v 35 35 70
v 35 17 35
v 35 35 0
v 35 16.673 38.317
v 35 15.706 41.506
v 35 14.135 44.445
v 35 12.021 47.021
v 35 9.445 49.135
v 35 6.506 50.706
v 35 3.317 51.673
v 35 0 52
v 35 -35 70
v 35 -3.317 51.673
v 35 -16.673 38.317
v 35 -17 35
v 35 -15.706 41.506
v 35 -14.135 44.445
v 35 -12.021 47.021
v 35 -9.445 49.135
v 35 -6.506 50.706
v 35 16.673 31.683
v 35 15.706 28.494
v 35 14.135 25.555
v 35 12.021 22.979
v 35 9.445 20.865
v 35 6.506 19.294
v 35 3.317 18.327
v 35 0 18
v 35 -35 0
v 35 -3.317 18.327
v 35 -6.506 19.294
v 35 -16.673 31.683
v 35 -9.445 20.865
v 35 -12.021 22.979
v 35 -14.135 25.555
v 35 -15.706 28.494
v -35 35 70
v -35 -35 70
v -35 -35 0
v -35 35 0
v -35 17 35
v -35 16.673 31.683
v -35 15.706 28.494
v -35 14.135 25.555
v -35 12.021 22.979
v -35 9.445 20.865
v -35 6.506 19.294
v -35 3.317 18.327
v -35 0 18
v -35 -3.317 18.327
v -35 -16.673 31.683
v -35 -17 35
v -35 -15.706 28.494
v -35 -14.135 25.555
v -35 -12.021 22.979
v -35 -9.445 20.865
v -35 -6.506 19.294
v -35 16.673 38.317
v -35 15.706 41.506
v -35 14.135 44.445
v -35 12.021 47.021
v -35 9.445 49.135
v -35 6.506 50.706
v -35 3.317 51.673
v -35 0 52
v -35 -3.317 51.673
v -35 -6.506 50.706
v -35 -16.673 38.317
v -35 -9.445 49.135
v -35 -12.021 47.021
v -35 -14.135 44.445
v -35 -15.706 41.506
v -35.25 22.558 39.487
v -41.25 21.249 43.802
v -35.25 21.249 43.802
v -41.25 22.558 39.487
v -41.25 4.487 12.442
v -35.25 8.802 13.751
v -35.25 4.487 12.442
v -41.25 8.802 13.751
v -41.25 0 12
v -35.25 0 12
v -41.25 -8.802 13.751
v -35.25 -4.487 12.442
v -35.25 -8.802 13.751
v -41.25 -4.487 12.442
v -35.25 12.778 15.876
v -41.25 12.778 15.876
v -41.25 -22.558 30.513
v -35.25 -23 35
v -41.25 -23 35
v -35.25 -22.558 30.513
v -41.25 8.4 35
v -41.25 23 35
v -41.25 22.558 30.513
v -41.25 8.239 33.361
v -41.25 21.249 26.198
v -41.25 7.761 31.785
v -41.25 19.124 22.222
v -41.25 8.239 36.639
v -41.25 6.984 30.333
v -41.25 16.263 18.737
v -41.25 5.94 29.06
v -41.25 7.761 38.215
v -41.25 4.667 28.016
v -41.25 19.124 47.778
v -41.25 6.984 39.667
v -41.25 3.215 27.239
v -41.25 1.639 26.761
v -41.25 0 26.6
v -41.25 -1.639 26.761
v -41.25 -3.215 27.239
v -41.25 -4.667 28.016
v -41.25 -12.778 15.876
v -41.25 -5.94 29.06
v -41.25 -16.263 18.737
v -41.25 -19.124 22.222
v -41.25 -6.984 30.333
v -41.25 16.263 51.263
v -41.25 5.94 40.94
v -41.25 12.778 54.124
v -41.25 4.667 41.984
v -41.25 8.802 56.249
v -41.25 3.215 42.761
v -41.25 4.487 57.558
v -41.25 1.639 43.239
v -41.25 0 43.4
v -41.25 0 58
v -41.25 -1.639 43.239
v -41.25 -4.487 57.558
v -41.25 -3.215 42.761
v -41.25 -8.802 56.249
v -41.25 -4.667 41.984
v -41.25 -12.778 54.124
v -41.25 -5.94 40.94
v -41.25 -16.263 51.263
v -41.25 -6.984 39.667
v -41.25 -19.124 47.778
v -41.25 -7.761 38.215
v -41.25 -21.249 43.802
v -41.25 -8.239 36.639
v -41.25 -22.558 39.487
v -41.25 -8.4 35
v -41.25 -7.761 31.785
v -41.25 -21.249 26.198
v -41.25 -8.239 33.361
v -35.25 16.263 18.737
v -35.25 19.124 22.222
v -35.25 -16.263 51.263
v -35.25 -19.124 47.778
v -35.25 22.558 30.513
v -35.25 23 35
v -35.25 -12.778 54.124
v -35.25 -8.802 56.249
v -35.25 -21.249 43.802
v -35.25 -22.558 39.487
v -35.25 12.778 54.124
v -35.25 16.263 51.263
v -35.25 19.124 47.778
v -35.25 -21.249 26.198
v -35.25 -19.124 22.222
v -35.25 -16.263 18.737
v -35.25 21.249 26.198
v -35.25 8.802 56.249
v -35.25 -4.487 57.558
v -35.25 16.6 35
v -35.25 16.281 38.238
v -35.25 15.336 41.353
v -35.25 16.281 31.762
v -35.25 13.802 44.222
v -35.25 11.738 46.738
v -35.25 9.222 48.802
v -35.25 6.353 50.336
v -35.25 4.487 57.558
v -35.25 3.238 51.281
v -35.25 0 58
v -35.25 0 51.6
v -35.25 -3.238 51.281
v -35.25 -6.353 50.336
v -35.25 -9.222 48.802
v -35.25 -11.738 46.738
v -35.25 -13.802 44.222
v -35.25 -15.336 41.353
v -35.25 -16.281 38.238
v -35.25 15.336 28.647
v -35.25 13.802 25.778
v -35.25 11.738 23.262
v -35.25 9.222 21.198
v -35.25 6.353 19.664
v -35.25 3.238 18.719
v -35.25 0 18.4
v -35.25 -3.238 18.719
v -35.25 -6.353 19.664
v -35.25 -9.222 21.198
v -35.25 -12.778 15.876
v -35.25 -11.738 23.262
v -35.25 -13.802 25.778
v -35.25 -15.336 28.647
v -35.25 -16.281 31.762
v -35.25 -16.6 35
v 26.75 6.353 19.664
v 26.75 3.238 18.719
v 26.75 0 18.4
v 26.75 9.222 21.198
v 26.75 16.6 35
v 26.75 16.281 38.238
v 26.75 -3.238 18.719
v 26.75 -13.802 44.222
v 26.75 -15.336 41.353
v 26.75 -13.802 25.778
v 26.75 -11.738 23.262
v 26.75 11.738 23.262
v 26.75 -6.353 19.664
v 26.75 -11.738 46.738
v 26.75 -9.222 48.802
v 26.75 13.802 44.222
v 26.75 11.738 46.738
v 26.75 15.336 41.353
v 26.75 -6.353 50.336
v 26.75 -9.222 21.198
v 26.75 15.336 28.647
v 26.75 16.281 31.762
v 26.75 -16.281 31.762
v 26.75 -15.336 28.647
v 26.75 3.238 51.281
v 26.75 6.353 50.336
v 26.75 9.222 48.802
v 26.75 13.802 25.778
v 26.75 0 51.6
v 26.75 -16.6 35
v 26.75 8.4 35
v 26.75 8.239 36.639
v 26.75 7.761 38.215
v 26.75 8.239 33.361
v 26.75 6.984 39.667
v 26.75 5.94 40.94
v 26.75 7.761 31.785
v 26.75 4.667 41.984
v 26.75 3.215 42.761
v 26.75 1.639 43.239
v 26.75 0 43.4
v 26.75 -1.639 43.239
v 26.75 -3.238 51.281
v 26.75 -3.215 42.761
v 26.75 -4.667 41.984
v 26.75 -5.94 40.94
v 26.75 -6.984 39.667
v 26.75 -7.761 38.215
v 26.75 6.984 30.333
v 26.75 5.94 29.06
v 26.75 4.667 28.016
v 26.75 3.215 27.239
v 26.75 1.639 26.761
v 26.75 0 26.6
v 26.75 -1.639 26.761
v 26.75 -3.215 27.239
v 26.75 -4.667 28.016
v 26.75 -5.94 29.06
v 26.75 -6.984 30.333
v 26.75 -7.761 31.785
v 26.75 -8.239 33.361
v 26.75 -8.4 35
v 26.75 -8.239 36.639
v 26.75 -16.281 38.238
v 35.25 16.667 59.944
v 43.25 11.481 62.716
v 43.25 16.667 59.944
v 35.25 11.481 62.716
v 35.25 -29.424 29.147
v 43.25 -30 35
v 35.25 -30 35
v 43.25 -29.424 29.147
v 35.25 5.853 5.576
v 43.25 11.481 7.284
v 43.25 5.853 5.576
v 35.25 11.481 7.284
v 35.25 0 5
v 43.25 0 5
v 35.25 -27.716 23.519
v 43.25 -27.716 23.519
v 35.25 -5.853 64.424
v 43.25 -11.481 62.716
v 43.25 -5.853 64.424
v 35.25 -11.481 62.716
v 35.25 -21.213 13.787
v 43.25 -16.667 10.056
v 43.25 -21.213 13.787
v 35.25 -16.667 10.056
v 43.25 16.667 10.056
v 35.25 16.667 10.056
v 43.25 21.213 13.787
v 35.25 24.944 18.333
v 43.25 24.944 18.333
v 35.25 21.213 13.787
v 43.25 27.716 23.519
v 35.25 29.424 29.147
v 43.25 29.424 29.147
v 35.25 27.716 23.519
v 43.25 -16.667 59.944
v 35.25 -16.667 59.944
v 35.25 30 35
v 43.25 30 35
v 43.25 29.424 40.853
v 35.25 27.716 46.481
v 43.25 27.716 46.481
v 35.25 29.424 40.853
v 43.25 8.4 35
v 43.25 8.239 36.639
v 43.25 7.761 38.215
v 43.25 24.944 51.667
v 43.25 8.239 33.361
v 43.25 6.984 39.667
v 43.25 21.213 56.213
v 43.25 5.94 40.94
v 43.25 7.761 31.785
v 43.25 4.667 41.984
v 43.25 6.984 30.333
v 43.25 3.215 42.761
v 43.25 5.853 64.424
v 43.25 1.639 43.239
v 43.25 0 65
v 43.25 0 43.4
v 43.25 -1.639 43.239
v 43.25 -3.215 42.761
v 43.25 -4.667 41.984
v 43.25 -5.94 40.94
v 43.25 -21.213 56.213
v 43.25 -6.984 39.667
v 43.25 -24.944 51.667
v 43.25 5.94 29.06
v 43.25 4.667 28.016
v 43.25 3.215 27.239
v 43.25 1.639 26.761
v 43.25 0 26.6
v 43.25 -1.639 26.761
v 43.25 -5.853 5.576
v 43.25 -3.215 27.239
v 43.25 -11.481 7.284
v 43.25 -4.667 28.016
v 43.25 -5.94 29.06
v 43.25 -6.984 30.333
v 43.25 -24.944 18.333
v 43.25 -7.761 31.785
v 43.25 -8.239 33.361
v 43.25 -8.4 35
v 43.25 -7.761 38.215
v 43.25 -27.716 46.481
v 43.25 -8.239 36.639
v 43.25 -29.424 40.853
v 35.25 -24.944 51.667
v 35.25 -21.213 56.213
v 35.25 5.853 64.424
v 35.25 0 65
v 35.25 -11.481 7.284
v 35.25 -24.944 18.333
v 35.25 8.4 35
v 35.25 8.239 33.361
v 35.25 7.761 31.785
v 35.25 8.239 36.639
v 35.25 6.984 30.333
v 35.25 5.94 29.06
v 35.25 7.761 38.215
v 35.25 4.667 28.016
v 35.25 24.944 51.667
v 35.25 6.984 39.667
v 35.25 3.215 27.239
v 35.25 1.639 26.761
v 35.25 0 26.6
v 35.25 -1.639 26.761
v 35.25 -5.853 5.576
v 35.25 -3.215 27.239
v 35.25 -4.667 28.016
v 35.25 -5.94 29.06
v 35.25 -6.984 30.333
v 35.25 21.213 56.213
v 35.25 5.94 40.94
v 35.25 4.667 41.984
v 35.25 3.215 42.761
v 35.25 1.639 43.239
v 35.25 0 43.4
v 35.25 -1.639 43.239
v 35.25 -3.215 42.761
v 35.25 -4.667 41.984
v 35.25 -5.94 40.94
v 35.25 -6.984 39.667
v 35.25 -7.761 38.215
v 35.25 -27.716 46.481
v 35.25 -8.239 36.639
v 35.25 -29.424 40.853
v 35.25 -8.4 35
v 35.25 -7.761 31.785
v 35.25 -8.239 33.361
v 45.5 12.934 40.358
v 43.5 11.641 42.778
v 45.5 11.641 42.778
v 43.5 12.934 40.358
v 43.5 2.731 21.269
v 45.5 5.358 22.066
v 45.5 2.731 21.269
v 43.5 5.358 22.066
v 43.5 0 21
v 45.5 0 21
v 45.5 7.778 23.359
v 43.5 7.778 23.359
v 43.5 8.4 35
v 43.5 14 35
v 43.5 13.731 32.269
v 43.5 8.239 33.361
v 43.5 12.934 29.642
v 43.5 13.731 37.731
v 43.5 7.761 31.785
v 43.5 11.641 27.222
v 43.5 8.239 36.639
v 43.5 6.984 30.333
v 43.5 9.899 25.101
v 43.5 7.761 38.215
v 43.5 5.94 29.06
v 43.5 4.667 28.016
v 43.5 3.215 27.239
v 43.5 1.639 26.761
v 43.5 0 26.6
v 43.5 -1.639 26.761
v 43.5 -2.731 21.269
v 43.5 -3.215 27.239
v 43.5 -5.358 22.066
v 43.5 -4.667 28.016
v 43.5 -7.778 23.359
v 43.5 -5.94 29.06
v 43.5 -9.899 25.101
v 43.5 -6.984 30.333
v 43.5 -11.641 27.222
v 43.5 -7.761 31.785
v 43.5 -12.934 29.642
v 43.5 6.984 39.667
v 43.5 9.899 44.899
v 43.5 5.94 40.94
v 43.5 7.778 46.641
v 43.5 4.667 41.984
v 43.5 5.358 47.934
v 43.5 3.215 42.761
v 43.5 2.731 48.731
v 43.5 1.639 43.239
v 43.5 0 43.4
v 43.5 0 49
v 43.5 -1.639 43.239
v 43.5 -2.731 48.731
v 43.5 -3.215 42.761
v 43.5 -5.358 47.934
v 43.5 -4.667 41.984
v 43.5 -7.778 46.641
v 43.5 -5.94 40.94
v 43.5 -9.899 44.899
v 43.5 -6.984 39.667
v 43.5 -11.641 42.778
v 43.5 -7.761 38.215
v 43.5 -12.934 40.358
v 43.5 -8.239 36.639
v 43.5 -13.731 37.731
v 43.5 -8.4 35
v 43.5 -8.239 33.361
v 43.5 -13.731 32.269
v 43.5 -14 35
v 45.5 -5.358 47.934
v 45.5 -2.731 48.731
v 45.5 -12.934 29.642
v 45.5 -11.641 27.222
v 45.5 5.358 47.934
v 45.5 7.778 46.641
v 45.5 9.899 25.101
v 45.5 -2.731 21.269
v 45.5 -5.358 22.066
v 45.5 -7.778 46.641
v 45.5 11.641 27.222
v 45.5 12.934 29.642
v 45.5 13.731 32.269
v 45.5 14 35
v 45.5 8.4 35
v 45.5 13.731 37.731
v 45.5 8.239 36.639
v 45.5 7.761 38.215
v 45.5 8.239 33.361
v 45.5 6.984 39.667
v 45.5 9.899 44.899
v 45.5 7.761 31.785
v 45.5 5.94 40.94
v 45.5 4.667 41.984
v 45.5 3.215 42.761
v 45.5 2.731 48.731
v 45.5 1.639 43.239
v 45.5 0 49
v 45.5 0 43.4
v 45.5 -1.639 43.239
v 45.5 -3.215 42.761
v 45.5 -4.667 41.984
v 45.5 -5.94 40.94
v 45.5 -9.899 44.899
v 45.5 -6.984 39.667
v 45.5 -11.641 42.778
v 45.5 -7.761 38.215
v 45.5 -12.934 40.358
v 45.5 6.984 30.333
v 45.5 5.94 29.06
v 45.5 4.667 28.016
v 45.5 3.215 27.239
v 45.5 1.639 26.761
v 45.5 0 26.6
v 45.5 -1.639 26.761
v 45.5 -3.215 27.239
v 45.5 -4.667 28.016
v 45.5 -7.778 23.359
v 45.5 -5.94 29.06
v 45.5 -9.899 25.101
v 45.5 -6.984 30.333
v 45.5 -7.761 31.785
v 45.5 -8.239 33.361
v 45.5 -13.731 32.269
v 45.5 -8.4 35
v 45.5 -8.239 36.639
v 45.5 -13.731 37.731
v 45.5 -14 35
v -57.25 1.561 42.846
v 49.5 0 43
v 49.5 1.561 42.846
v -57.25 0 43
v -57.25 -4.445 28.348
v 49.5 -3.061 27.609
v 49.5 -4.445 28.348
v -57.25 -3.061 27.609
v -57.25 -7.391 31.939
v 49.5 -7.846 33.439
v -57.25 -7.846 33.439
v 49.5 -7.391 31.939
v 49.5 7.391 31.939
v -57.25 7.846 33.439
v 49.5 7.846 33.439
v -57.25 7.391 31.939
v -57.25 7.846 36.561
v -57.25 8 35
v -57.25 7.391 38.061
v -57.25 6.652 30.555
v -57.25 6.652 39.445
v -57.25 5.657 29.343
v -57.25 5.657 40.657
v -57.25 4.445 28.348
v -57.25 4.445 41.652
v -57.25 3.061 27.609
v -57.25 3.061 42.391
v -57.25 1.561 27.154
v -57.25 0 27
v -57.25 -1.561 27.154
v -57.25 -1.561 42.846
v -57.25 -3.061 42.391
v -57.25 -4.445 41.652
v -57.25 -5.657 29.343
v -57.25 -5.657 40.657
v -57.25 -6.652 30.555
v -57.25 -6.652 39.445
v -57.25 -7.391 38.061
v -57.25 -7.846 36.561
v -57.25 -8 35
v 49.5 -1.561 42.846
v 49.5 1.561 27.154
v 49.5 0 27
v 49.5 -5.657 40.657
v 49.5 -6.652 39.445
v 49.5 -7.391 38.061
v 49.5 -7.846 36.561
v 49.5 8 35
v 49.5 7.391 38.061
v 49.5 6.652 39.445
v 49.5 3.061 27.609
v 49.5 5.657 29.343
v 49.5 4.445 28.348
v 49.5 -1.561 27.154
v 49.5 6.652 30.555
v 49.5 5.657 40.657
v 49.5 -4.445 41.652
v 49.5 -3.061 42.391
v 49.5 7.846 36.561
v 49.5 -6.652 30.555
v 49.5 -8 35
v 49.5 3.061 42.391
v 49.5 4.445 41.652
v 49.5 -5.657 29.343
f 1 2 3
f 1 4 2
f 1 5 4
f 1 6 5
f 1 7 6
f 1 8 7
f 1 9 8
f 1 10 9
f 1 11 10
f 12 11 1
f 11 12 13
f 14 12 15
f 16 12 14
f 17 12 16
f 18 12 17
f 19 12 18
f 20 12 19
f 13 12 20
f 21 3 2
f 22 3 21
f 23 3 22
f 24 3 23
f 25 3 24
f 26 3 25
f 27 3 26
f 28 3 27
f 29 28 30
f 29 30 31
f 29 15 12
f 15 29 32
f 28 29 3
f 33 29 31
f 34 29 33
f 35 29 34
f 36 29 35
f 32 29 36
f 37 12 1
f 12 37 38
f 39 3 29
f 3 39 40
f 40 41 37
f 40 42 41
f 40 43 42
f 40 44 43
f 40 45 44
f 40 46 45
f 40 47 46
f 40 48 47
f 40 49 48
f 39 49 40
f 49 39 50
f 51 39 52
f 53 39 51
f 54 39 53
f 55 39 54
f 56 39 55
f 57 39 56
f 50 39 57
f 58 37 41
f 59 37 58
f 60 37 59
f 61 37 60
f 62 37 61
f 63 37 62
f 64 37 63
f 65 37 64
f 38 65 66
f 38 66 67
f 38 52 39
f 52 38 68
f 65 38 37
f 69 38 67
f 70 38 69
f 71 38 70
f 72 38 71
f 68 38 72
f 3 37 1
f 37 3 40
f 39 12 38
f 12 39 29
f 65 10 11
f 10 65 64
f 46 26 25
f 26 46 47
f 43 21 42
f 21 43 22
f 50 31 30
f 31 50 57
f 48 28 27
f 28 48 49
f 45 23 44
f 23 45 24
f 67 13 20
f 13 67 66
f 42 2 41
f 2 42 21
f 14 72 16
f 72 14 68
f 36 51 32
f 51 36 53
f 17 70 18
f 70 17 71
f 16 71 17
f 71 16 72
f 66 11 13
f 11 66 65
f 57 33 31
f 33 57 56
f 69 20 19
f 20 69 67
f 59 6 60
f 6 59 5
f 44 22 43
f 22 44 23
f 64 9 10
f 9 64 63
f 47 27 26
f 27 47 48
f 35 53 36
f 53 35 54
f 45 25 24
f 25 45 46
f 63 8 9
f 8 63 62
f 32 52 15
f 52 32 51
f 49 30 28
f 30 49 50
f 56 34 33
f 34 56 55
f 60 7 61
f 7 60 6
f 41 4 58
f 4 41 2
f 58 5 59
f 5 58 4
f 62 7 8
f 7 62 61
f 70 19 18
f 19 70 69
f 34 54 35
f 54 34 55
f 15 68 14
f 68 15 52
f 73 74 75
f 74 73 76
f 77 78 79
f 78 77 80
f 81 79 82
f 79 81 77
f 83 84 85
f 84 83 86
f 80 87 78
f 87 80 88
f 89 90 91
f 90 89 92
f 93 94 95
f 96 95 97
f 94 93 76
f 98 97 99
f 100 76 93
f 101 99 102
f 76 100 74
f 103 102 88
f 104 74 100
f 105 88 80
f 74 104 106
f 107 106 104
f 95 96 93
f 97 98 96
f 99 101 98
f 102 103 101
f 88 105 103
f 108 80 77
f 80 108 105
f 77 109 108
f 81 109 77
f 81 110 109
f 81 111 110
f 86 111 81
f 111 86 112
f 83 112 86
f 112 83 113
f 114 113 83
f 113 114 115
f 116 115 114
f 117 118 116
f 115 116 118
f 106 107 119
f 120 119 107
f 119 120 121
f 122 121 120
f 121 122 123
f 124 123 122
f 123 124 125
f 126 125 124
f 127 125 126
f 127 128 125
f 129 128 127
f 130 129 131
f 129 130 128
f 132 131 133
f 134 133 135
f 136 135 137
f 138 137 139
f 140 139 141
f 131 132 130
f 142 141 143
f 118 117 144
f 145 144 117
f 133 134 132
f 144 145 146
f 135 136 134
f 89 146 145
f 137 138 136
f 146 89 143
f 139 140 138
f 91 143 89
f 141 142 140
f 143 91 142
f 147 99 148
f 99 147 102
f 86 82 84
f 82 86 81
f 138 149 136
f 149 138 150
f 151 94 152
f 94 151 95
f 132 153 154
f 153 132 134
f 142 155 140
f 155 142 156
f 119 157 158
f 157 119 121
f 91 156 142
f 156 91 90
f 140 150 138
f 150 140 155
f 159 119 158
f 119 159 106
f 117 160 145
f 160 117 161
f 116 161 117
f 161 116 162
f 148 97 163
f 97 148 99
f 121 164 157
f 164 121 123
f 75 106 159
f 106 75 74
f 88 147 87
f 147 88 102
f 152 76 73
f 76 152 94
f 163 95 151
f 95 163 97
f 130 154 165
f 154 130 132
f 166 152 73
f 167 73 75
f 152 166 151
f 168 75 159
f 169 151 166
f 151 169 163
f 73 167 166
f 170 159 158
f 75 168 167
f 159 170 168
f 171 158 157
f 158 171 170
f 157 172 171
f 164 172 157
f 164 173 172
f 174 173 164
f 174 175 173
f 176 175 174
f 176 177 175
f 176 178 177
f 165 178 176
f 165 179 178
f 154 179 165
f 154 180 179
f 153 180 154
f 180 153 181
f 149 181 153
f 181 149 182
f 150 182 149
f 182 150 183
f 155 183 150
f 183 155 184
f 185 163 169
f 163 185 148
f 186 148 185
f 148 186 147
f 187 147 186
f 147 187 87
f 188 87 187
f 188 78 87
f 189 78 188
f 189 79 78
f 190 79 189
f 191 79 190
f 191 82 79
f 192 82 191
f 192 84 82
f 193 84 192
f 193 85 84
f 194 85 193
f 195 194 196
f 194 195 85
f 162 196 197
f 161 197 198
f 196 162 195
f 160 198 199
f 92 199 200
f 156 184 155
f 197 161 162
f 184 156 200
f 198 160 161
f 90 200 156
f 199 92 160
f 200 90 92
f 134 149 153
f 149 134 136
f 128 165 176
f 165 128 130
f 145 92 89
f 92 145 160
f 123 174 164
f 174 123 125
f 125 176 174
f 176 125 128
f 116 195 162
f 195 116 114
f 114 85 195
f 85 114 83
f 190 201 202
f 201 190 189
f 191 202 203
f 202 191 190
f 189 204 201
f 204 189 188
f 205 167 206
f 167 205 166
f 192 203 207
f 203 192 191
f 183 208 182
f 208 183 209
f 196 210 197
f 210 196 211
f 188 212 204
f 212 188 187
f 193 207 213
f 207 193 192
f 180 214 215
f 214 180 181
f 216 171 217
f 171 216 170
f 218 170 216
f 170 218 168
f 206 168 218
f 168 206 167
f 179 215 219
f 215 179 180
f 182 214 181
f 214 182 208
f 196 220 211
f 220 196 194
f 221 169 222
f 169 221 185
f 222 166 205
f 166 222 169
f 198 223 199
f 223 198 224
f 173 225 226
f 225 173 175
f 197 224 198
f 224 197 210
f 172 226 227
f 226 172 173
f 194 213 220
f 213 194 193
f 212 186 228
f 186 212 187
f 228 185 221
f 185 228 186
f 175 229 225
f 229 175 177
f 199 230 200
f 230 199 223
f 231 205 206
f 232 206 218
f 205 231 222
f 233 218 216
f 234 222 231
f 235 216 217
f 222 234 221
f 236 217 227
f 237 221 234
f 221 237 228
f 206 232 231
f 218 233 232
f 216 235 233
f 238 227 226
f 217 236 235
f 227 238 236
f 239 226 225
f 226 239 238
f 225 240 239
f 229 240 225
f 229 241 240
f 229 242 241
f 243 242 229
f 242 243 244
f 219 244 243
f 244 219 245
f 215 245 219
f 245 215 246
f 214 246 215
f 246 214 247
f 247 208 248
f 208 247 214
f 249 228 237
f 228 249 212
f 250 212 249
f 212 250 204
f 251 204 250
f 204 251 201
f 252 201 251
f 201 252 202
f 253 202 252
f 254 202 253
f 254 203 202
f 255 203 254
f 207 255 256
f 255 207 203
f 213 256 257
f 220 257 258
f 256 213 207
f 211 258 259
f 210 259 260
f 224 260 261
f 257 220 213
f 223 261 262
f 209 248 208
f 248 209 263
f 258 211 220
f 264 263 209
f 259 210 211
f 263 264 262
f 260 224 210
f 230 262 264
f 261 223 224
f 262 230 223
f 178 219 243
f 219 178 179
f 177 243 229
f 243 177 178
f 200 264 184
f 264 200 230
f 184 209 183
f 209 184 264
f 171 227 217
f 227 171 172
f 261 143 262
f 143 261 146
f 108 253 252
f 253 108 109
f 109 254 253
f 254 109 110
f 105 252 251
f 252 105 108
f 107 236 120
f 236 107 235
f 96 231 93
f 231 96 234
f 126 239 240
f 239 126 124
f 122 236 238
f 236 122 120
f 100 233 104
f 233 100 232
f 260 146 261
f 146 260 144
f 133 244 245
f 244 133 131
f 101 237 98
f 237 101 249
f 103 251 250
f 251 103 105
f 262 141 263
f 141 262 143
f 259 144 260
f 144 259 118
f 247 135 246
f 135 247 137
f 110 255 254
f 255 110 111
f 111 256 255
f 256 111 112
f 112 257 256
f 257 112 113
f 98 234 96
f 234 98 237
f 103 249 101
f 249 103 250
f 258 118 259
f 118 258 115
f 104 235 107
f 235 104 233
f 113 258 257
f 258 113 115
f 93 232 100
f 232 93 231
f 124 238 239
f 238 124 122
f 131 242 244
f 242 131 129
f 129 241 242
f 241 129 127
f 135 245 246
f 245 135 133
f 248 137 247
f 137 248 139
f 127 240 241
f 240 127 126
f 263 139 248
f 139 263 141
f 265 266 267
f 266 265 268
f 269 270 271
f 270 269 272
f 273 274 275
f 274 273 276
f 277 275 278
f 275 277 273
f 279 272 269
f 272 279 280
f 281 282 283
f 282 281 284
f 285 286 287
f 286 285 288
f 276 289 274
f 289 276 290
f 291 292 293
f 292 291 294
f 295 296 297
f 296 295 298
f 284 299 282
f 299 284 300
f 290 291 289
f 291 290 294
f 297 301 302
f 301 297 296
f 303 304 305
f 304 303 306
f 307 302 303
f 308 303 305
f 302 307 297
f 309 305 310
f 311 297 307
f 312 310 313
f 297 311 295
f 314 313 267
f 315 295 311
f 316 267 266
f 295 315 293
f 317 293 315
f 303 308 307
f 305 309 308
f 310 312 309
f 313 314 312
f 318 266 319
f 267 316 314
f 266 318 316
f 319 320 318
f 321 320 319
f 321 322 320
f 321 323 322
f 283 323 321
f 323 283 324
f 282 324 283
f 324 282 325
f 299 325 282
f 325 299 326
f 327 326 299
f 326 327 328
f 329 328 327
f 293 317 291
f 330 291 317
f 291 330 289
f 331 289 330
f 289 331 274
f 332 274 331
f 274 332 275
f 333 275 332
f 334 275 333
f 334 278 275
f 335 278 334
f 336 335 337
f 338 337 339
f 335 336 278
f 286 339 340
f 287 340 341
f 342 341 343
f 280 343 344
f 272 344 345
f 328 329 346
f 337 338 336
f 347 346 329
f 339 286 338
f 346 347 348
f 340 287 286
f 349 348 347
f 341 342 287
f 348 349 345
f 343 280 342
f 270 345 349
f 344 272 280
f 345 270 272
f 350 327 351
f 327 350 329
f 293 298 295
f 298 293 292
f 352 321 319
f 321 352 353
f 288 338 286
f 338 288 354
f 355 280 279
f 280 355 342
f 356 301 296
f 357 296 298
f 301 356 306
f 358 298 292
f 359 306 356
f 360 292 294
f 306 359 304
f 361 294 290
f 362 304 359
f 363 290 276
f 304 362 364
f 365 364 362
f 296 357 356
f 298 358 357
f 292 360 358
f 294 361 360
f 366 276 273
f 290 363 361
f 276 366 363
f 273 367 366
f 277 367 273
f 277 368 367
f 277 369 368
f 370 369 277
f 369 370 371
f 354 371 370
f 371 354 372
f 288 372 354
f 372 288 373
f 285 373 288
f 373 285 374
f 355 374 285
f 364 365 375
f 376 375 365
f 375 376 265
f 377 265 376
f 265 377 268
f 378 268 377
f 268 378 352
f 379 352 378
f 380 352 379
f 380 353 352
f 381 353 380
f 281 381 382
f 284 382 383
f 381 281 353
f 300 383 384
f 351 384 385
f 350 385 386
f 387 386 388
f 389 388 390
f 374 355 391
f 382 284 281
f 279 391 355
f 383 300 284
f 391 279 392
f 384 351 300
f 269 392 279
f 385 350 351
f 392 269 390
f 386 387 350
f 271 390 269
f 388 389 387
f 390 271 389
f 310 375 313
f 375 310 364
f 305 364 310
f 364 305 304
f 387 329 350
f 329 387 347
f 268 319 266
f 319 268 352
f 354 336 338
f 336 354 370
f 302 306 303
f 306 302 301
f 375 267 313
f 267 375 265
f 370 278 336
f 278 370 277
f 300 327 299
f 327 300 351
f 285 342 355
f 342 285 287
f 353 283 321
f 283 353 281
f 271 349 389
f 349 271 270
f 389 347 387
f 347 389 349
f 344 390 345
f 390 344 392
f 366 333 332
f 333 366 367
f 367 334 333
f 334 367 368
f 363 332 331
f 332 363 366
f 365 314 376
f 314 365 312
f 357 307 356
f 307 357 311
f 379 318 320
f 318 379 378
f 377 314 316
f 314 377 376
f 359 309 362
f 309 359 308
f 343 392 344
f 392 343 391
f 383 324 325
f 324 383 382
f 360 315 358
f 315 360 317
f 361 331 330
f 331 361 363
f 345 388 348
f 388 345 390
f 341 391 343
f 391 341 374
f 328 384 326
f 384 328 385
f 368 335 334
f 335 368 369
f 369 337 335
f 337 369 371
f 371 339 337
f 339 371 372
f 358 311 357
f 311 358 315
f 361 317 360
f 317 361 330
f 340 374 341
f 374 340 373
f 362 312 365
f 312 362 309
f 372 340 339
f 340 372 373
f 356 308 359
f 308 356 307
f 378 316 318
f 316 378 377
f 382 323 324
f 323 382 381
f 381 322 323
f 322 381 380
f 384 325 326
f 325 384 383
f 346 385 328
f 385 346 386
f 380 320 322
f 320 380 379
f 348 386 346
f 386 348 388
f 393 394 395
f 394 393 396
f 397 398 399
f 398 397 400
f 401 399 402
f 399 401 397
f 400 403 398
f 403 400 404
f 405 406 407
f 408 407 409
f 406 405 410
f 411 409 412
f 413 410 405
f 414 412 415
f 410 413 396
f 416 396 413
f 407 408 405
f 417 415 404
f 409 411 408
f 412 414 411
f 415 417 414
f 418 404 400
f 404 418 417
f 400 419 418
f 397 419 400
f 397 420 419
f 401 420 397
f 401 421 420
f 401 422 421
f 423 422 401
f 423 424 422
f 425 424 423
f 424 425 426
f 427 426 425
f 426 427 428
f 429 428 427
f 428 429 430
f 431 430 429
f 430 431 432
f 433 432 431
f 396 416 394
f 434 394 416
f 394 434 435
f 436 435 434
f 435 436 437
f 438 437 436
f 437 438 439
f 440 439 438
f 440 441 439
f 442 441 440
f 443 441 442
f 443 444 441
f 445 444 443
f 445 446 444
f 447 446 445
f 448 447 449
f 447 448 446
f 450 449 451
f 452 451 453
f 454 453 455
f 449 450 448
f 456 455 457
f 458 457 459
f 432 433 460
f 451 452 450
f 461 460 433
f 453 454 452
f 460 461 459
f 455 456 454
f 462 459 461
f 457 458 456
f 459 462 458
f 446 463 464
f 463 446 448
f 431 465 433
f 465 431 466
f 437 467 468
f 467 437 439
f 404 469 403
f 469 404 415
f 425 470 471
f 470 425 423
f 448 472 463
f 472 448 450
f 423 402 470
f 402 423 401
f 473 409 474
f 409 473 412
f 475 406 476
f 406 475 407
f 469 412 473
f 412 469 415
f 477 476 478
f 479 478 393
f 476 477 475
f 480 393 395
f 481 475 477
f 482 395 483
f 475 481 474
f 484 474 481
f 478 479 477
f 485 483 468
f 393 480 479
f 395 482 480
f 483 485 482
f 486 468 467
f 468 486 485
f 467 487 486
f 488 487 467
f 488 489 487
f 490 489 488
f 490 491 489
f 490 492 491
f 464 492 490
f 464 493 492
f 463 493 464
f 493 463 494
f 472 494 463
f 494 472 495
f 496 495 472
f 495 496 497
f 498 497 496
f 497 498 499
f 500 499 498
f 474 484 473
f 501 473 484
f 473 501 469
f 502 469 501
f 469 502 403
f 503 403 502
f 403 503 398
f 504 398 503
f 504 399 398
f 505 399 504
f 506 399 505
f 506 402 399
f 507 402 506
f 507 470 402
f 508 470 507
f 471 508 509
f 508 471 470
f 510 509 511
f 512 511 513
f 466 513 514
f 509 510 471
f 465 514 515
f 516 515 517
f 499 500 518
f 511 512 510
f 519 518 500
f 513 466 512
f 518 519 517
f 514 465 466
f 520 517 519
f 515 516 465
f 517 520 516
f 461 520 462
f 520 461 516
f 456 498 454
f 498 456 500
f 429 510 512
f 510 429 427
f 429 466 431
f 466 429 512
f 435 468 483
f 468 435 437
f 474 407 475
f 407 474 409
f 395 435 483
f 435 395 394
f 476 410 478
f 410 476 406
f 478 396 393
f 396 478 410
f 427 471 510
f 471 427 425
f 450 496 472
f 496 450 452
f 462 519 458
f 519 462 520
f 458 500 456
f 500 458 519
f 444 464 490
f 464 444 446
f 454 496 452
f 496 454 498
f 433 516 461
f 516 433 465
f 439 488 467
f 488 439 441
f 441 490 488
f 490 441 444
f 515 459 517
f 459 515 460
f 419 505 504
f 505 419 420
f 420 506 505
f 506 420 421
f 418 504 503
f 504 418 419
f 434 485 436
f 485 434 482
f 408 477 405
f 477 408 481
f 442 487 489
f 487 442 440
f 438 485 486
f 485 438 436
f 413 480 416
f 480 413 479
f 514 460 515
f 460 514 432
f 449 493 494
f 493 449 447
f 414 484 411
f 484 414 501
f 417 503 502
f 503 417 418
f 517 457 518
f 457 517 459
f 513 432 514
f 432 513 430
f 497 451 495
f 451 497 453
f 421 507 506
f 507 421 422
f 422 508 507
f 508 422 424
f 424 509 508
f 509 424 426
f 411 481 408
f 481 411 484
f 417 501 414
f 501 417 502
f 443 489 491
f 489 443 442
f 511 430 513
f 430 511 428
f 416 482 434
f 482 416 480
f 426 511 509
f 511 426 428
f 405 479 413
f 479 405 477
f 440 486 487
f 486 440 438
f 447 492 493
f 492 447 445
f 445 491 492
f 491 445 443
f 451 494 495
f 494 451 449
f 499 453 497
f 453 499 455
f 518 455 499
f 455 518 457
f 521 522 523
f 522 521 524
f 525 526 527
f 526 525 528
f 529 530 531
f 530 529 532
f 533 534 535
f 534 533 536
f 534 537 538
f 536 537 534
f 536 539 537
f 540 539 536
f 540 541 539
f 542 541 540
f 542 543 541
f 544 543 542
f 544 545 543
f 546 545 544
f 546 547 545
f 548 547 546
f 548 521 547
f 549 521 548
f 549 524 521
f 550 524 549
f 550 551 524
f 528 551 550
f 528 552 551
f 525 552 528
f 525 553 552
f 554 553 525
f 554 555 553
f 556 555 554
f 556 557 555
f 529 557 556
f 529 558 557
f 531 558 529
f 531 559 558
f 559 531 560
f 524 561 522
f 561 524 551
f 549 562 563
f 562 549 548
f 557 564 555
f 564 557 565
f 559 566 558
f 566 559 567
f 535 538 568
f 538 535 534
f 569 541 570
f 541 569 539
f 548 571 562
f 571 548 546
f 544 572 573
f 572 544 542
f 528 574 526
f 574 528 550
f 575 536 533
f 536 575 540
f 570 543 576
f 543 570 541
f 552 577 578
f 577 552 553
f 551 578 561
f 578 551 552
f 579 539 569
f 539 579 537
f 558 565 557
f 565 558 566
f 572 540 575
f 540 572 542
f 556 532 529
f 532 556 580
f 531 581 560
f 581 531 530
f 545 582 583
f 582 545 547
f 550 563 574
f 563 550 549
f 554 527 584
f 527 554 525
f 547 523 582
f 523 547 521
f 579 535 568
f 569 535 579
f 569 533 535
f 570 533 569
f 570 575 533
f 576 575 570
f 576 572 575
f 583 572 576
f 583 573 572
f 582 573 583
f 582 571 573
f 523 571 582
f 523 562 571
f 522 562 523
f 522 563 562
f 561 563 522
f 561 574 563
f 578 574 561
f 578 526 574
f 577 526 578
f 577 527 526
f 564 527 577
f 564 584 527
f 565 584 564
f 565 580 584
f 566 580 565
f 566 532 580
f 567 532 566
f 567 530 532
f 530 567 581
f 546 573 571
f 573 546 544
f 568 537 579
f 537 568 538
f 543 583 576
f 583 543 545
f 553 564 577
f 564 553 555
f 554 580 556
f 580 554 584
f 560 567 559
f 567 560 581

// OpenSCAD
$fn = 32;

// ------------------------------------------------------------------------
// Bushed housing: 70 x 70 x 70 mm housing, bushing d33.2
// Every part is its own module, assembly() places them once.
// ------------------------------------------------------------------------

// --- part 1 ---
module housing() {
  difference() {
    translate([-35, -35, 0]) cube([70, 70, 70]);
    translate([0, 0, 35]) rotate([0, 90, 0]) cylinder(h = 72, d = 34, center = true);
  }
}

// --- part 2 ---
module bushing() {
  difference() {
    union() {
      cylinder(h = 6, d = 46);
      translate([0, 0, 6]) cylinder(h = 62, d = 33.2);
    }
    translate([0, 0, -1]) cylinder(h = 70, d = 16.8);
  }
}

// --- part 3 ---
module shaft() {
  translate([0, 0, -53.375]) cylinder(h = 106.75, d = 16);
}

// --- part 4 ---
module cover() {
  difference() {
    cylinder(h = 8, d = 60);
    translate([0, 0, -1]) cylinder(h = 10, d = 16.8);
  }
}

// --- part 5 ---
module washer() {
  difference() {
      translate([0, 0, 0]) cylinder(h = 2, d = 28);
      translate([0, 0, -1]) cylinder(h = 4, d = 16.8);
    }
}

// --- assembly ---
module assembly() {
  translate([0, 0, 0]) rotate([0, 0, 0]) housing();
  translate([-41.25, 0, 35]) rotate([0, 90, 0]) bushing();
  translate([-3.875, 0, 35]) rotate([0, 90, 0]) shaft();
  translate([35.25, 0, 35]) rotate([0, 90, 0]) cover();
  translate([43.5, 0, 35]) rotate([0, 90, 0]) washer();
}

assembly();
